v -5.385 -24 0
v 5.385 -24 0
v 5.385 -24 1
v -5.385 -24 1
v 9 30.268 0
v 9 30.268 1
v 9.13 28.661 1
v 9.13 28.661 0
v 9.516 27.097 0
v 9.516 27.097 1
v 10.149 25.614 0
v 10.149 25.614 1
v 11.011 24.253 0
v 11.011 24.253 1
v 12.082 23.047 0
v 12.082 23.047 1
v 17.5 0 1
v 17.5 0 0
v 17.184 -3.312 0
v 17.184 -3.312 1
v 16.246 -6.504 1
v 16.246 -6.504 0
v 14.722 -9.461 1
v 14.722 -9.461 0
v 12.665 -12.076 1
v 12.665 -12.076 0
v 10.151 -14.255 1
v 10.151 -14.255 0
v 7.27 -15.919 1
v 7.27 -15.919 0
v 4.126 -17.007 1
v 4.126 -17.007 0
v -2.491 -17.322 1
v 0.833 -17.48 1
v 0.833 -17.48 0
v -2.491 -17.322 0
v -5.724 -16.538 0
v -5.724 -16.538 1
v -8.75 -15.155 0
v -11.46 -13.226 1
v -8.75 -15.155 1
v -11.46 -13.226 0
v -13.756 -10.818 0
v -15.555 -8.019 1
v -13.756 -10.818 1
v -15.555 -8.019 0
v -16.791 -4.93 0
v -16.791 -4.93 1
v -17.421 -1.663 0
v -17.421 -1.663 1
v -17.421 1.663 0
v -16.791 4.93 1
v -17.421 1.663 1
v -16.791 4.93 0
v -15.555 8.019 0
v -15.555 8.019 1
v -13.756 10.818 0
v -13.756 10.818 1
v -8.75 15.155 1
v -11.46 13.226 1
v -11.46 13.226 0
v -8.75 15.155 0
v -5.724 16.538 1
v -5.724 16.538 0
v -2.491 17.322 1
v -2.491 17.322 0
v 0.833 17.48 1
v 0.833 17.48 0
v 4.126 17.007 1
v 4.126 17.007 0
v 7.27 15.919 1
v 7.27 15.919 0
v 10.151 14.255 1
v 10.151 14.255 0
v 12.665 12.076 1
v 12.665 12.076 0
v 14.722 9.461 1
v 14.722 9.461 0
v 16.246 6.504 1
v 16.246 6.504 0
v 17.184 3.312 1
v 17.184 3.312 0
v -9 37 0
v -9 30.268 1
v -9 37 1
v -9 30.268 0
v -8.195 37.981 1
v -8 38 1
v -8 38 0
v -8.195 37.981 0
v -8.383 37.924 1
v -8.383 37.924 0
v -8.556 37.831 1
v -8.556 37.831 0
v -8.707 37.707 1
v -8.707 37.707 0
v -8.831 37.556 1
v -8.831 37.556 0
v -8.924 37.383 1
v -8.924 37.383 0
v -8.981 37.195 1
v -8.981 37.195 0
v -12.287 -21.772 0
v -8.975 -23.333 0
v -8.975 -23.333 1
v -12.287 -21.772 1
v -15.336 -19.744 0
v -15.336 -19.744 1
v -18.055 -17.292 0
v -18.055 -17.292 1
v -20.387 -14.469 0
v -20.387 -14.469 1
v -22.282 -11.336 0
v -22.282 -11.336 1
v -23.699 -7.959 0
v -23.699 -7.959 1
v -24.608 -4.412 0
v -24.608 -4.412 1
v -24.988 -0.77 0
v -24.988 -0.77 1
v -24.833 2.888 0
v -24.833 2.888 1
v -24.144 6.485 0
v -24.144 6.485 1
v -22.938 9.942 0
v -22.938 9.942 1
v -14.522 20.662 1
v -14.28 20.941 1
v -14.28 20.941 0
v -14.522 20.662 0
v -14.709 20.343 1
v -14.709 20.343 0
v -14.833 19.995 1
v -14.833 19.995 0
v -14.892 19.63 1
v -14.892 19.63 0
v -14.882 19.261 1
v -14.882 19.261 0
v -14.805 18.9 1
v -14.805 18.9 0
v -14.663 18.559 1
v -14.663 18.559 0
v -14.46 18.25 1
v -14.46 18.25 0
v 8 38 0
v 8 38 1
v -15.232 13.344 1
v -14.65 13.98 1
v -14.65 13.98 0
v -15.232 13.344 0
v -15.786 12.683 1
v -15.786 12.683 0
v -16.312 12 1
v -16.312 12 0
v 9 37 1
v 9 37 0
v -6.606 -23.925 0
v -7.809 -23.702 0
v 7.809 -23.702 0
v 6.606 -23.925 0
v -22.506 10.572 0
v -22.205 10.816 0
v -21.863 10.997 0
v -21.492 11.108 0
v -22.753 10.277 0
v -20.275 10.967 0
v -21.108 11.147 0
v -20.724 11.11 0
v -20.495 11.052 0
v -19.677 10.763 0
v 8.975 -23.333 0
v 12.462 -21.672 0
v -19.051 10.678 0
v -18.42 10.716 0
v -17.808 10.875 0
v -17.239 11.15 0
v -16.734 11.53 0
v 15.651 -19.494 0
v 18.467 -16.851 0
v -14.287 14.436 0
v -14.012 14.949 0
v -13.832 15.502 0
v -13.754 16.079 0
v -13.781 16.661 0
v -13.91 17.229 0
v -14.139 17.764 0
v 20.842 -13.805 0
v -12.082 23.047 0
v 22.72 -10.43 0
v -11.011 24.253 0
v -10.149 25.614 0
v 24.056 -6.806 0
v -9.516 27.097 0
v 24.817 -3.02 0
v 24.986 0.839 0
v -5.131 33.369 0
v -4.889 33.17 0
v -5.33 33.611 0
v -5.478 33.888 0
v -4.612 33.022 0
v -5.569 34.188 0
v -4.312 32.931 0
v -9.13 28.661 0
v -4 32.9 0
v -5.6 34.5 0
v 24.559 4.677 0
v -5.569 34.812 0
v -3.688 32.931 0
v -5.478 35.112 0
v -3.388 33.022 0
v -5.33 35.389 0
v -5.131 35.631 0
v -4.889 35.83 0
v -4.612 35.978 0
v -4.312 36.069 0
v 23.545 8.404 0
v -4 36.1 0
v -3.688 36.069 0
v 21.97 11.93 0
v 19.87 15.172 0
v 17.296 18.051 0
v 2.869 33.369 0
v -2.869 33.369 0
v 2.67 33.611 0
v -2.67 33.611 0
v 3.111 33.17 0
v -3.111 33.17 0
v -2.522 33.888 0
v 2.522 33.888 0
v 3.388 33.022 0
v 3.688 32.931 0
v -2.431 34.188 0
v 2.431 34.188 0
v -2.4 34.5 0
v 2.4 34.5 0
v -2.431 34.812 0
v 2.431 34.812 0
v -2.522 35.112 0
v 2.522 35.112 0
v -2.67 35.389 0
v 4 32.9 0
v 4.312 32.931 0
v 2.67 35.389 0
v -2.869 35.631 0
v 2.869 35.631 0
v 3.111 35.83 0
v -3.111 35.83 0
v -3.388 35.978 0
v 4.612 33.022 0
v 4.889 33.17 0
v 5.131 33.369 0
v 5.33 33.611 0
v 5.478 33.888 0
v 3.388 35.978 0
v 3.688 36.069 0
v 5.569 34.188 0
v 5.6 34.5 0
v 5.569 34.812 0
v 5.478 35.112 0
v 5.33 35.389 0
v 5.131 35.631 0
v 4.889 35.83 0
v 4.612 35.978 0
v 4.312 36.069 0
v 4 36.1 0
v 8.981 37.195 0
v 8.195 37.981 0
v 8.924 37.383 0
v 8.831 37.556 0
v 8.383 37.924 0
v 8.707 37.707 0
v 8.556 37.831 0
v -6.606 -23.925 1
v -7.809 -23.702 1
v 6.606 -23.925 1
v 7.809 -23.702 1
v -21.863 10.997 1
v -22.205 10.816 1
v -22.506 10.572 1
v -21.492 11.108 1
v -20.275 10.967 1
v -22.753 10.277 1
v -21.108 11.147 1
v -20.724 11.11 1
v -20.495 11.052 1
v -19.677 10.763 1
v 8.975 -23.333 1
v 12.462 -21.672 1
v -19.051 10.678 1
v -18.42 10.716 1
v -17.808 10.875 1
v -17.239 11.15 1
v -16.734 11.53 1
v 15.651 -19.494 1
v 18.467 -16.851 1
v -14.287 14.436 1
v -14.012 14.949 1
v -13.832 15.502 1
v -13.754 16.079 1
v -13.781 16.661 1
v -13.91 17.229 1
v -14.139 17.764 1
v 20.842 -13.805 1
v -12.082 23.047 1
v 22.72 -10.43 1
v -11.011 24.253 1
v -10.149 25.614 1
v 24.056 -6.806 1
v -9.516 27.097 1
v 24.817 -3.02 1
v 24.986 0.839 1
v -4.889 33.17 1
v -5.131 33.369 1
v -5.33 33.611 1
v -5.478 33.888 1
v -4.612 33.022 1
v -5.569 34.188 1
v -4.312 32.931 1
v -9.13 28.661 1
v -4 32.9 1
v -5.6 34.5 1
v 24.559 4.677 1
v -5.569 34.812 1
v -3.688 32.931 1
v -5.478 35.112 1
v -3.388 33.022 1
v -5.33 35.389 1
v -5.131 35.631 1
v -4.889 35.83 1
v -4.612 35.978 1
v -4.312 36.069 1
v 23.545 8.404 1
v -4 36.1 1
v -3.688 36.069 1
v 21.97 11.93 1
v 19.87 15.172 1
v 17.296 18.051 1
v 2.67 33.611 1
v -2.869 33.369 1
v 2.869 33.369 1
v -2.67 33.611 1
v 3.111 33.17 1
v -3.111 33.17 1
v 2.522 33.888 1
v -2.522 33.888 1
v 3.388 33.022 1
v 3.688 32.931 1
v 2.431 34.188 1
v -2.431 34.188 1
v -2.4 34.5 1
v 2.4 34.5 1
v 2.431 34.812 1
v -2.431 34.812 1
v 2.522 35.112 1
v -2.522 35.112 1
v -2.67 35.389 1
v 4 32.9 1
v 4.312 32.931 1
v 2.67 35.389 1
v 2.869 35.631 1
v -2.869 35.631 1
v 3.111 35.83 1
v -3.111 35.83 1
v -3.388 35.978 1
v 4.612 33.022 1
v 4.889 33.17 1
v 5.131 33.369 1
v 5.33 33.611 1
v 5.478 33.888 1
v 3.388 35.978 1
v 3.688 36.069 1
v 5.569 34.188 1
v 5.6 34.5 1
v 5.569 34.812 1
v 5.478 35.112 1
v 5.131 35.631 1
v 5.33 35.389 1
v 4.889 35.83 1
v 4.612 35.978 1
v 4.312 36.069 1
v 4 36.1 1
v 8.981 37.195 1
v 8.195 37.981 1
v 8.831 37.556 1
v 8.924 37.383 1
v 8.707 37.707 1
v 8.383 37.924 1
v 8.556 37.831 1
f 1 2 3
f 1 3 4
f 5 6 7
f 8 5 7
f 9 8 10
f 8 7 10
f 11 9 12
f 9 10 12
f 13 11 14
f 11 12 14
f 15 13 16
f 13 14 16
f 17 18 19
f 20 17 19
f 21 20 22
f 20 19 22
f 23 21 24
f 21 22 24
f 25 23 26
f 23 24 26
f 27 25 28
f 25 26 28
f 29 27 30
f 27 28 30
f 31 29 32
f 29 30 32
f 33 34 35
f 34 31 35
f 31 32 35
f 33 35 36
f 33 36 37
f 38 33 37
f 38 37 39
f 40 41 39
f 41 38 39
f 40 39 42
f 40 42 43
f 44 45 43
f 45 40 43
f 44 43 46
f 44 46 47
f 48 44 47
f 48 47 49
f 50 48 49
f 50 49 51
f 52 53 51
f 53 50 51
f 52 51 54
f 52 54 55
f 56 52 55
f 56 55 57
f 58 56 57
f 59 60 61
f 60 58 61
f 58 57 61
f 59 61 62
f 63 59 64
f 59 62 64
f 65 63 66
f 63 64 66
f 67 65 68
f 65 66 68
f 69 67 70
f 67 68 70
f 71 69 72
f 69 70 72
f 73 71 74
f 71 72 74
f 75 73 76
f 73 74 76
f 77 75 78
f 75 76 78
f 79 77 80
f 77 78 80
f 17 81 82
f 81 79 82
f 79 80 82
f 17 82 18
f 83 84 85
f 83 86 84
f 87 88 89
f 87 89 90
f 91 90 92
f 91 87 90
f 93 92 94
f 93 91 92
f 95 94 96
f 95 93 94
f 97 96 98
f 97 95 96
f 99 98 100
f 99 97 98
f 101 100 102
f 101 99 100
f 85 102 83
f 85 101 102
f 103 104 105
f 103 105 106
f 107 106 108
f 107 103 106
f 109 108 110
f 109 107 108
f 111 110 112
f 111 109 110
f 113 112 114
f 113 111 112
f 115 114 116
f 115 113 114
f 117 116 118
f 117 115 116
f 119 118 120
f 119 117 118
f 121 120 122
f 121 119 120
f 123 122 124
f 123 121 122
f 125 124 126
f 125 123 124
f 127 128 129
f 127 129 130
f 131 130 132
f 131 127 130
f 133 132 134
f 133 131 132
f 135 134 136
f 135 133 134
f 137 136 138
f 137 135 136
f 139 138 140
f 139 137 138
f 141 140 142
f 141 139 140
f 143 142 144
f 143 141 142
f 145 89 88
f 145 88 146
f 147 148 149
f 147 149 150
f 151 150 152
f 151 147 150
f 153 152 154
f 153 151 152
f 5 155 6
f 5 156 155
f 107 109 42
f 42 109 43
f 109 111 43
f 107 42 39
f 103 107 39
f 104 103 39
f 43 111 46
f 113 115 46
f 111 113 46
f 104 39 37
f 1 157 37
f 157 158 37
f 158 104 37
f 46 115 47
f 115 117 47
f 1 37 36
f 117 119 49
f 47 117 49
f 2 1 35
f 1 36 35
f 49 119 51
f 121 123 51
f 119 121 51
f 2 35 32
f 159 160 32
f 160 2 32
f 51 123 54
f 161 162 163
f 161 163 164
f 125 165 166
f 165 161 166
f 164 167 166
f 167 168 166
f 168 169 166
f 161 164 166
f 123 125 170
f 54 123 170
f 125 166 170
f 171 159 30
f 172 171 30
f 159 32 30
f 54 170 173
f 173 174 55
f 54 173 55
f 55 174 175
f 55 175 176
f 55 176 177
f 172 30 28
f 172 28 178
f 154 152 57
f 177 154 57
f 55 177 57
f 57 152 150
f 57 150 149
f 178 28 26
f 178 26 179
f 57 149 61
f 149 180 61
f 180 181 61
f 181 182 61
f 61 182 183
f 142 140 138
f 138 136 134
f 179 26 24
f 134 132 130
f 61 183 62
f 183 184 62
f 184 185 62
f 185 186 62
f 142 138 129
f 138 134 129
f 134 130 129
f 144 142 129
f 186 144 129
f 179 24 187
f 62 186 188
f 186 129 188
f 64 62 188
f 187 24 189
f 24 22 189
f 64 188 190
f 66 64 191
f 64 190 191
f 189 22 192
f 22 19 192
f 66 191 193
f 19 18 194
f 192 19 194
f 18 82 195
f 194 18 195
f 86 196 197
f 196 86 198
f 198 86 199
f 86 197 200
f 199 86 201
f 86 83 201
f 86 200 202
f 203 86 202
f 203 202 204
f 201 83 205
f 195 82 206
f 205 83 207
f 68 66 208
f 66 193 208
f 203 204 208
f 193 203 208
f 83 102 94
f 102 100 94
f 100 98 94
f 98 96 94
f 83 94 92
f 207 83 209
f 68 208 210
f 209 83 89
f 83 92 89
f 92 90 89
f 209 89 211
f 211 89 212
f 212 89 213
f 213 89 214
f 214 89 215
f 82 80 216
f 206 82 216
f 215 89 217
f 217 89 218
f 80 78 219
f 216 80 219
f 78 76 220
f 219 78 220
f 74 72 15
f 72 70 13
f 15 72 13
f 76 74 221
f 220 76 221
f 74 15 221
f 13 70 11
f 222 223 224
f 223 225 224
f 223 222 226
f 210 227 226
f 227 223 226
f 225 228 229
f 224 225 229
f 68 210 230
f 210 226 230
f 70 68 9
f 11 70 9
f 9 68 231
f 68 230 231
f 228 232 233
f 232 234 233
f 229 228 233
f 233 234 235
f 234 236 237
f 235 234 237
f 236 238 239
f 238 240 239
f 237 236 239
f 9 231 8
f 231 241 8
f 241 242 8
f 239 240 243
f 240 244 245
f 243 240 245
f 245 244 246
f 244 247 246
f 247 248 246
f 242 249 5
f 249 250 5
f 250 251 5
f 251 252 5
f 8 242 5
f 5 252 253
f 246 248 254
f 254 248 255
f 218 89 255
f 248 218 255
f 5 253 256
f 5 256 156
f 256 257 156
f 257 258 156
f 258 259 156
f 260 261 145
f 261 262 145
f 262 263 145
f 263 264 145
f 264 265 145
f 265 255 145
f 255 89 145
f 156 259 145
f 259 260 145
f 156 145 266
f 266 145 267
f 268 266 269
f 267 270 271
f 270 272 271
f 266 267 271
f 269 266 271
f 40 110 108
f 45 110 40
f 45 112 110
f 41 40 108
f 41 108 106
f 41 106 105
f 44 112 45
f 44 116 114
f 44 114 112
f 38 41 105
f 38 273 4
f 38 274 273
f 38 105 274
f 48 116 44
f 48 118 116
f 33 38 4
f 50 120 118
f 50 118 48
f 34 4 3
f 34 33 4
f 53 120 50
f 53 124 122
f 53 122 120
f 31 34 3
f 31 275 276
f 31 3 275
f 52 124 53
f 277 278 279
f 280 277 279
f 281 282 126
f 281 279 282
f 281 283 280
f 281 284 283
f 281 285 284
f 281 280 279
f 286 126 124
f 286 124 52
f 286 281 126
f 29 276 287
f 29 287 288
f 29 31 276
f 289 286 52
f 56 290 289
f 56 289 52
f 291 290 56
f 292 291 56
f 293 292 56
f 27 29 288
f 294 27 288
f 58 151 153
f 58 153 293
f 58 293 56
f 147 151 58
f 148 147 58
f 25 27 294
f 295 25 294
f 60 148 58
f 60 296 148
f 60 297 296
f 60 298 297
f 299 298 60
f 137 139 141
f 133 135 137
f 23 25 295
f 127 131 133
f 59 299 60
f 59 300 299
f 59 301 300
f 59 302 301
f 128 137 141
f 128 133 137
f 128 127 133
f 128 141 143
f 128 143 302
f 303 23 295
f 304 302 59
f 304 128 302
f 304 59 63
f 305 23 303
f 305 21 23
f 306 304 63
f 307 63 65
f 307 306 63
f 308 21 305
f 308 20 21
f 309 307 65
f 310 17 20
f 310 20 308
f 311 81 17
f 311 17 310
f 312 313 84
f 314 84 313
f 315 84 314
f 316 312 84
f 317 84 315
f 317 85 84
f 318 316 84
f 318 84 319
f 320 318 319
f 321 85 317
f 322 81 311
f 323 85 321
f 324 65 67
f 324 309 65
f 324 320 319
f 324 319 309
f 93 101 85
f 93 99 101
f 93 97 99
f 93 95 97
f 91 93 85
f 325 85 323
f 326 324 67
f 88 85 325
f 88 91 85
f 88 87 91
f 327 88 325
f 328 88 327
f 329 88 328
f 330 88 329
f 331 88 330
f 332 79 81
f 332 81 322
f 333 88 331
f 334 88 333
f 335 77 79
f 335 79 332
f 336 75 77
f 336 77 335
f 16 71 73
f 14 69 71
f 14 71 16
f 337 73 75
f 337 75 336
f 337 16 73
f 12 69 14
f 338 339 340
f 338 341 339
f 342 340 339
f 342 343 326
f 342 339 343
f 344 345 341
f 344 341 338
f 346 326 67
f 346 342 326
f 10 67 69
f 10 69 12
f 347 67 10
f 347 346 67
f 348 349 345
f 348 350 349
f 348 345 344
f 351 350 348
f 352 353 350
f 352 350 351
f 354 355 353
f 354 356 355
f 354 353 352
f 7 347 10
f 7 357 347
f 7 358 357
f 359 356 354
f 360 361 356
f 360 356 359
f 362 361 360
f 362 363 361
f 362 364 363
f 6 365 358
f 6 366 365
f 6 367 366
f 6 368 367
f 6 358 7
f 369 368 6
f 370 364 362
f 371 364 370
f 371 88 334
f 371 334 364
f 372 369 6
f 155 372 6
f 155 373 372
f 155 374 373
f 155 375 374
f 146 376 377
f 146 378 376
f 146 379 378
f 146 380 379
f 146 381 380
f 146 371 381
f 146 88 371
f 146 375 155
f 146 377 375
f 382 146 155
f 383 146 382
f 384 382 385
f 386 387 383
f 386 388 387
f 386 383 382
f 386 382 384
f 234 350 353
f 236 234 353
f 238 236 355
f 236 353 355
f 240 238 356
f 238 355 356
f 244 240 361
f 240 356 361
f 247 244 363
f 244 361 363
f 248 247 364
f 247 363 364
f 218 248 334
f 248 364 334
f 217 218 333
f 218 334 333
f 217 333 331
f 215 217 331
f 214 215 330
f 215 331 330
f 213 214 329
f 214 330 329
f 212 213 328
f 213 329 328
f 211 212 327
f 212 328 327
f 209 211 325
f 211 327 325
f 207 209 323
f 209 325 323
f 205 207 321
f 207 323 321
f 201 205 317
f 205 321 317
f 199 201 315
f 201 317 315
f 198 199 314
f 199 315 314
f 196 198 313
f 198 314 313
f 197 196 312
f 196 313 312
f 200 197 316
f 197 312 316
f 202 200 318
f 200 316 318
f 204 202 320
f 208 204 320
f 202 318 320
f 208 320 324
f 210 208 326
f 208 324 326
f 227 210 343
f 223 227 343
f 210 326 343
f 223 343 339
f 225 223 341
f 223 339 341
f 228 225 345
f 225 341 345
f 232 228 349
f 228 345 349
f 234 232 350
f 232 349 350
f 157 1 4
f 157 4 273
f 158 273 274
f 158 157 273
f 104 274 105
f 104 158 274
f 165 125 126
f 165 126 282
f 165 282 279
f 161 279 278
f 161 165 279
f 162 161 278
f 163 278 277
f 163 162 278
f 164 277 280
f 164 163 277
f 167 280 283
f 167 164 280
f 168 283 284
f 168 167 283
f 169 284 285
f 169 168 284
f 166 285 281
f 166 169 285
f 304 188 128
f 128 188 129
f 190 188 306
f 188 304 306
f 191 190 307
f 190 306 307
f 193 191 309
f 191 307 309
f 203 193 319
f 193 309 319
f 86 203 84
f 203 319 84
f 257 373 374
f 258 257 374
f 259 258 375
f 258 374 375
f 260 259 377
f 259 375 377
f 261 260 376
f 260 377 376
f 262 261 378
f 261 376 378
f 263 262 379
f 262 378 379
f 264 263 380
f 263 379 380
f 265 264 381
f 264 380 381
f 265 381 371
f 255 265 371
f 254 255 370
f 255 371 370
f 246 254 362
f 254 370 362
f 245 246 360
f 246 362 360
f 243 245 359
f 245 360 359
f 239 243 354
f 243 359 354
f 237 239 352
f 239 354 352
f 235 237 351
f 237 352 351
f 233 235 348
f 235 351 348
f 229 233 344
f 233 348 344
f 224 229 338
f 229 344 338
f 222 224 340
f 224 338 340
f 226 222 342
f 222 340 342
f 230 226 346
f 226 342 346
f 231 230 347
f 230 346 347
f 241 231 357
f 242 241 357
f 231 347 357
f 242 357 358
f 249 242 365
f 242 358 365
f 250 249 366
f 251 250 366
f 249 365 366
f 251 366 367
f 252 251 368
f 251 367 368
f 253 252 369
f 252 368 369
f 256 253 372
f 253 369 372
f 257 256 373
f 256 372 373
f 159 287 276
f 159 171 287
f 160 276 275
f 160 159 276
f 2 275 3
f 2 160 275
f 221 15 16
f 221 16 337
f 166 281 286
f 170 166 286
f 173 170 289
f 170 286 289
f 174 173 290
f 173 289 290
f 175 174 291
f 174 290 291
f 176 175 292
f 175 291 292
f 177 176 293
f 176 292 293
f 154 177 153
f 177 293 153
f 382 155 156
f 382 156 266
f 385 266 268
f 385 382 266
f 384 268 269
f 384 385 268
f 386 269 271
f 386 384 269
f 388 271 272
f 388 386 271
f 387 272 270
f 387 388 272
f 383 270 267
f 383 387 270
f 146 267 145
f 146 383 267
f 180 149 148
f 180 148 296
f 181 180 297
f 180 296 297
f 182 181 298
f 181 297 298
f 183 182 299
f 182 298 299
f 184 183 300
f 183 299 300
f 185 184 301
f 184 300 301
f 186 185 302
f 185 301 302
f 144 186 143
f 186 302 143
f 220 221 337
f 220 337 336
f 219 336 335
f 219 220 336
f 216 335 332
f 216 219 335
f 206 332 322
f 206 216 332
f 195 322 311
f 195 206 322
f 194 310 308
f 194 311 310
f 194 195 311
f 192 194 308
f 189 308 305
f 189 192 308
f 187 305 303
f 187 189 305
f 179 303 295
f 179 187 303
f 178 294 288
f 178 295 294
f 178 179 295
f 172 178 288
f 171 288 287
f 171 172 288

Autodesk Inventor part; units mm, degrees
ref_plane "YZ Plane" through (0, 0, 0) normal (1, 0, 0) x (0, 1, 0)
ref_plane "XZ Plane" through (0, 0, 0) normal (0, 1, 0) x (-1, 0, 0)
ref_plane "XY Plane" through (0, 0, 0) normal (0, 0, 1) x (1, 0, 0)
sketch "Sketch1" plane through (0, 0, 0) normal (0, 0, 1) x (1, 0, 0)
  line L0 (-9, 26) -> (-9, 38)
  line L1 (-9, 38) -> (9, 38)
  line L2 (9, 38) -> (9, 26)
  line L3 (9, 26) -> (17.2958, 18.0514)
  line L4 (-9, 26) -> (-17.2958, 18.0514)
  arc A0 (-17.2958, 18.0514) -> (17.2958, 18.0514) centre (0, 0) ccw
  line L5 (-17.2958, 18.0514) -> (17.2958, 18.0514) construction
  line L6 (-9, 26) -> (9, 26) construction
  circle A1 centre (0, 0) radius 17.5
  point P0 (0, 38)
  dimension "d1" = 38
  dimension "d2" = 18
  dimension "d3" = 50
  dimension "d5" = 35
  dimension "d15" = 12
extrude "Extrusion1" add sketch "Sketch1" along normal blind 1
fillet "Fillet1" radius 10 2 edges at (9, 26, 0.5) (-9, 26, 0.5)
fillet "Fillet2" radius 1 2 edges at (9, 38, 0.5) (-9, 38, 0.5)
sketch "Sketch2" plane through (0, 0, 1) normal (0, 0, 1) x (1, 0, 0)
  circle A0 centre (-4, 34.5) radius 1.6
  circle A1 centre (4, 34.5) radius 1.6
  line L0 (-4, 34.5) -> (4, 34.5) construction
  line L1 (8, 38) -> (-8, 38) construction
  point P0 (0, 0)
  point P1 (0, 34.5)
  dimension "d10" = 3.5
  dimension "d11" = 3.2
  dimension "d12" = 8
extrude "Extrusion2" cut sketch "Sketch2" against normal through all
sketch "Sketch3" plane through (0, 0, 0) normal (0, 0, 1) x (1, 0, 0)
  line L0 (-15, -30) -> (15, -30)
  line L1 (15, -30) -> (15, -24)
  line L2 (15, -24) -> (-15, -24)
  line L3 (-15, -24) -> (-15, -30)
  point P0 (0, 0)
  point P1 (0, -24)
  dimension "d16" = 24
  dimension "d17" = 6
  dimension "d18" = 30
extrude "Trim" cut sketch "Sketch3" along normal through all
fillet "Fillet3" radius 10 2 edges at (7, -24, 0.5) (-7, -24, 0.5)
sketch "Sketch4" plane through (0, 0, 1) normal (0, 0, 1) x (1, 0, 0)
  line L0 (-18.002, 15.1055) -> (18.002, -15.1055) construction
  line L1 (0, 0) -> (14.5661, 0) construction
  arc A0 (-17.0012, 16.2238) -> (-18.9295, 13.9256) centre (0, 0) ccw construction
  arc A1 (-19.3524, 18.4675) -> (-21.5474, 15.8515) centre (0, 0) ccw
  arc A2 (-14.6499, 13.9801) -> (-16.3116, 11.9998) centre (0, 0) ccw
  arc A3 (-14.6499, 13.9801) -> (-19.3524, 18.4675) centre (-17.0012, 16.2238) ccw
  arc A4 (-21.5474, 15.8515) -> (-16.3116, 11.9998) centre (-18.9295, 13.9256) ccw
  dimension "d24" = 40
  dimension "d28" = 47
  dimension "d29" = 6.5
  dimension "d30" = 3
extrude "Extrusion4" cut sketch "Sketch4" against normal through all
fillet "Fillet5" radius 2 2 edges at (-15.9823, 19.31, 0.5) (-21.7544, 12.3186, 0.5)
properties part number "probe-gate" material "Stainless Steel"
